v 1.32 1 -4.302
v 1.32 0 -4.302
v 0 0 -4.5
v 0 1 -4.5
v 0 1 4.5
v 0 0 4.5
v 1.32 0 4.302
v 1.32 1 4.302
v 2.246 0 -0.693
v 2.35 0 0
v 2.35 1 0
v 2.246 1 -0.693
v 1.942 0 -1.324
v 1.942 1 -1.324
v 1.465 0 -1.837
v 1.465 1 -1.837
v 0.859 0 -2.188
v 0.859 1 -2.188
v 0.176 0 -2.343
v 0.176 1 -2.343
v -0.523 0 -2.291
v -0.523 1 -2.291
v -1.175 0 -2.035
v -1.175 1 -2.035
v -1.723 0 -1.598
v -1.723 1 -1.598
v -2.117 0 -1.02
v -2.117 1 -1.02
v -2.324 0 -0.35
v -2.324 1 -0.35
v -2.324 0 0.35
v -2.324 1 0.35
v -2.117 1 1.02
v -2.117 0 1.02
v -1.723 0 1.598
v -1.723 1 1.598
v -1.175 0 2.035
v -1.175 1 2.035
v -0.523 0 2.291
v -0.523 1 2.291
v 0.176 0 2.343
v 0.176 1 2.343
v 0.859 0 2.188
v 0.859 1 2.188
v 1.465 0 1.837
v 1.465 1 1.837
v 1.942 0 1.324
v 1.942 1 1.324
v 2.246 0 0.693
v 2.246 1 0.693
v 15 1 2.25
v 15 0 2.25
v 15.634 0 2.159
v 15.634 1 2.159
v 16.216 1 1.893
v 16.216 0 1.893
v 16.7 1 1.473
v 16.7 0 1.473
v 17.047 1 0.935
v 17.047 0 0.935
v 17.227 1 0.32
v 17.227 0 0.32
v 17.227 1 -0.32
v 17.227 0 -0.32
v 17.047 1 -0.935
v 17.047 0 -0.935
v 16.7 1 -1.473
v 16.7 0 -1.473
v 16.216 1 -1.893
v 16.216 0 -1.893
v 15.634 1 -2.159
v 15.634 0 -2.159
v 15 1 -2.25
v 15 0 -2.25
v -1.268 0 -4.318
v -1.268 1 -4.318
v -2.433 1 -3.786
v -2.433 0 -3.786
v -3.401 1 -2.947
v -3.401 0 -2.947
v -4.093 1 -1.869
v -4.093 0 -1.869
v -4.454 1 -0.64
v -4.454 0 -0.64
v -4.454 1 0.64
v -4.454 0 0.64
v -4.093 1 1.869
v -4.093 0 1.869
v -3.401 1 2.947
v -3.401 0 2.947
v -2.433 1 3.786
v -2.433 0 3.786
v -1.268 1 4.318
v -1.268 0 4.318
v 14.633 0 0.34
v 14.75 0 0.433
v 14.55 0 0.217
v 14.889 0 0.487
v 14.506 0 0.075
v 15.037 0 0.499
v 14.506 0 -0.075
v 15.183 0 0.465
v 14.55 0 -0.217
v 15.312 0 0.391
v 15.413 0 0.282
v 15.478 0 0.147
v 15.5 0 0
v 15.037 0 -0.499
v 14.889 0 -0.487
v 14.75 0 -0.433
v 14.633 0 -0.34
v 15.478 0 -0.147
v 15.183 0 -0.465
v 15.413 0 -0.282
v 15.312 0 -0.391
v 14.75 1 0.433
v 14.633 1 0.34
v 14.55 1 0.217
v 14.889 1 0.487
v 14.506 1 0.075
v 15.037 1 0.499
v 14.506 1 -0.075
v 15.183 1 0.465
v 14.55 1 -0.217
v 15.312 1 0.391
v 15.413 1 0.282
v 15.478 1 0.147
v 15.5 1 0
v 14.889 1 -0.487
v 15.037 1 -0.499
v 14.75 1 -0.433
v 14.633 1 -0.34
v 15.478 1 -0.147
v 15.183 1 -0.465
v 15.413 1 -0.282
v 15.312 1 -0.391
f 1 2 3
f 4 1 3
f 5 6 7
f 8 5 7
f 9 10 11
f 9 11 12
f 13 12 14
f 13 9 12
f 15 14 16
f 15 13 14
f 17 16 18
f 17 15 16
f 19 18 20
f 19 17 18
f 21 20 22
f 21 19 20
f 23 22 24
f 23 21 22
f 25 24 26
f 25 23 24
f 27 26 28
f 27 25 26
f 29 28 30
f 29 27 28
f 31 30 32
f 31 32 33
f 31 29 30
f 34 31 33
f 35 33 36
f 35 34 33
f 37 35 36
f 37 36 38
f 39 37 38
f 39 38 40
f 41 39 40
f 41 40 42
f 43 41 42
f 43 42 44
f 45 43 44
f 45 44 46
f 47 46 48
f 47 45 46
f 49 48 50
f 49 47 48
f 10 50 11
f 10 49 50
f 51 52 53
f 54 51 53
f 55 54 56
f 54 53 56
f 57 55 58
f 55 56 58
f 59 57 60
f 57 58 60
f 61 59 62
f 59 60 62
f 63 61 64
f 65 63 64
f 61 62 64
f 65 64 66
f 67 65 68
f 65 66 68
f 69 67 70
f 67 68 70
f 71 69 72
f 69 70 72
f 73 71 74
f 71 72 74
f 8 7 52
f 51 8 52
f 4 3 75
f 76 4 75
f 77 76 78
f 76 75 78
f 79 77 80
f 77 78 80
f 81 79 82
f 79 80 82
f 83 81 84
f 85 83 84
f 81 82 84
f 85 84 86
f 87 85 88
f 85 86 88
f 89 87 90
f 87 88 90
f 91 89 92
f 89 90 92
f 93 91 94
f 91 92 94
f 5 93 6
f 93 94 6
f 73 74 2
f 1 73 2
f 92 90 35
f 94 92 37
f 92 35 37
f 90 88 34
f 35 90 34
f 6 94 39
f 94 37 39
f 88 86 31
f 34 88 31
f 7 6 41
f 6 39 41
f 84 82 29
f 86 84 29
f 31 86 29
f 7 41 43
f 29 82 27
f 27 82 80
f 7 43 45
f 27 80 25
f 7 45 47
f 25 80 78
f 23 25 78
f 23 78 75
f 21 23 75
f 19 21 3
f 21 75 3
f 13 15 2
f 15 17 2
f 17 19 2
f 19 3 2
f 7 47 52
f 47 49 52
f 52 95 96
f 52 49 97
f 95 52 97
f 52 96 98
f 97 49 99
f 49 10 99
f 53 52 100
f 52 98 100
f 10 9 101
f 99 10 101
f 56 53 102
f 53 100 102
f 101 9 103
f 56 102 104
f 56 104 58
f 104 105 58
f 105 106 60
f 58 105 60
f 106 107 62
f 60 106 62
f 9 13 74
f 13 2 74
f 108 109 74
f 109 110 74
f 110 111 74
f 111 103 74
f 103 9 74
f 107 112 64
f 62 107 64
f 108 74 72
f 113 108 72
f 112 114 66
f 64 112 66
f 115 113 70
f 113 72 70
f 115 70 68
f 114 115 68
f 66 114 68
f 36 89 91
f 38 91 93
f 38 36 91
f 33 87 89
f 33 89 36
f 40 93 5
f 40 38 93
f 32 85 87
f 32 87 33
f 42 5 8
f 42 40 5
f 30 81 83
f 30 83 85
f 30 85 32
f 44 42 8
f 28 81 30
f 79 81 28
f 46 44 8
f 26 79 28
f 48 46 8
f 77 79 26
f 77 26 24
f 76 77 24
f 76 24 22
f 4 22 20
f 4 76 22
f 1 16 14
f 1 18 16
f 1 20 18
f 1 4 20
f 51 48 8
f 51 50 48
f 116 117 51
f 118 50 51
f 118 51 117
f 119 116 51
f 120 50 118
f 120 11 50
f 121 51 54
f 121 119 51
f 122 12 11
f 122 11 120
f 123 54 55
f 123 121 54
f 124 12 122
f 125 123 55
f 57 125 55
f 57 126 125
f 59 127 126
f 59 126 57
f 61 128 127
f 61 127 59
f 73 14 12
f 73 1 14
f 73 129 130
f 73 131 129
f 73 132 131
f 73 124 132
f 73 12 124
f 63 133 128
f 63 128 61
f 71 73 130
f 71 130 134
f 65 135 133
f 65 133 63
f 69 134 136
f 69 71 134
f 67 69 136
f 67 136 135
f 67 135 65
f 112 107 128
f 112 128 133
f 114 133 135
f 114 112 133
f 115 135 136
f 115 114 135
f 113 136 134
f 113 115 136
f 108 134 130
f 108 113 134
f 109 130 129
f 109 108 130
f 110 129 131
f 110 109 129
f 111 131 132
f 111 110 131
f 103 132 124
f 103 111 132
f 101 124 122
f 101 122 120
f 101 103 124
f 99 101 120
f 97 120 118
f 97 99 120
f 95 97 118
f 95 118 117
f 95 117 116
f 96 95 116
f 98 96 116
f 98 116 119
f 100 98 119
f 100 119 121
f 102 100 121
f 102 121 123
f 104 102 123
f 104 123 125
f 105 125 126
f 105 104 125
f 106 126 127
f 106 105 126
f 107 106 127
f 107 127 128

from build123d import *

# Parameters (mm, degrees)
SKETCH1_R           = 2.35
SKETCH1_R_2         = 0.5
BOSS_EXTRUDE1_DEPTH = 1


with BuildPart() as part:
    # Sketch1 → Boss-Extrude1 (new body)
    with BuildSketch(Plane(origin=(0, 0, 0), x_dir=(1, 0, 0), z_dir=(0, 1, 0))):
        with BuildLine():
            Line((1.320293399, 4.30195599), (0, 4.5))
            ThreePointArc((0, 4.5), (-4.5, 0), (0, -4.5))
            Line((0, -4.5), (1.320293399, -4.30195599))
            Line((1.320293399, -4.30195599), (15, -2.25))
            ThreePointArc((15, -2.25), (17.25, 0), (15, 2.25))
            Line((15, 2.25), (1.320293399, 4.30195599))
        make_face()
        Circle(SKETCH1_R, mode=Mode.SUBTRACT)
        with Locations((15, 0)):
            Circle(SKETCH1_R_2, mode=Mode.SUBTRACT)
    extrude(amount=BOSS_EXTRUDE1_DEPTH)


solid = part.part
